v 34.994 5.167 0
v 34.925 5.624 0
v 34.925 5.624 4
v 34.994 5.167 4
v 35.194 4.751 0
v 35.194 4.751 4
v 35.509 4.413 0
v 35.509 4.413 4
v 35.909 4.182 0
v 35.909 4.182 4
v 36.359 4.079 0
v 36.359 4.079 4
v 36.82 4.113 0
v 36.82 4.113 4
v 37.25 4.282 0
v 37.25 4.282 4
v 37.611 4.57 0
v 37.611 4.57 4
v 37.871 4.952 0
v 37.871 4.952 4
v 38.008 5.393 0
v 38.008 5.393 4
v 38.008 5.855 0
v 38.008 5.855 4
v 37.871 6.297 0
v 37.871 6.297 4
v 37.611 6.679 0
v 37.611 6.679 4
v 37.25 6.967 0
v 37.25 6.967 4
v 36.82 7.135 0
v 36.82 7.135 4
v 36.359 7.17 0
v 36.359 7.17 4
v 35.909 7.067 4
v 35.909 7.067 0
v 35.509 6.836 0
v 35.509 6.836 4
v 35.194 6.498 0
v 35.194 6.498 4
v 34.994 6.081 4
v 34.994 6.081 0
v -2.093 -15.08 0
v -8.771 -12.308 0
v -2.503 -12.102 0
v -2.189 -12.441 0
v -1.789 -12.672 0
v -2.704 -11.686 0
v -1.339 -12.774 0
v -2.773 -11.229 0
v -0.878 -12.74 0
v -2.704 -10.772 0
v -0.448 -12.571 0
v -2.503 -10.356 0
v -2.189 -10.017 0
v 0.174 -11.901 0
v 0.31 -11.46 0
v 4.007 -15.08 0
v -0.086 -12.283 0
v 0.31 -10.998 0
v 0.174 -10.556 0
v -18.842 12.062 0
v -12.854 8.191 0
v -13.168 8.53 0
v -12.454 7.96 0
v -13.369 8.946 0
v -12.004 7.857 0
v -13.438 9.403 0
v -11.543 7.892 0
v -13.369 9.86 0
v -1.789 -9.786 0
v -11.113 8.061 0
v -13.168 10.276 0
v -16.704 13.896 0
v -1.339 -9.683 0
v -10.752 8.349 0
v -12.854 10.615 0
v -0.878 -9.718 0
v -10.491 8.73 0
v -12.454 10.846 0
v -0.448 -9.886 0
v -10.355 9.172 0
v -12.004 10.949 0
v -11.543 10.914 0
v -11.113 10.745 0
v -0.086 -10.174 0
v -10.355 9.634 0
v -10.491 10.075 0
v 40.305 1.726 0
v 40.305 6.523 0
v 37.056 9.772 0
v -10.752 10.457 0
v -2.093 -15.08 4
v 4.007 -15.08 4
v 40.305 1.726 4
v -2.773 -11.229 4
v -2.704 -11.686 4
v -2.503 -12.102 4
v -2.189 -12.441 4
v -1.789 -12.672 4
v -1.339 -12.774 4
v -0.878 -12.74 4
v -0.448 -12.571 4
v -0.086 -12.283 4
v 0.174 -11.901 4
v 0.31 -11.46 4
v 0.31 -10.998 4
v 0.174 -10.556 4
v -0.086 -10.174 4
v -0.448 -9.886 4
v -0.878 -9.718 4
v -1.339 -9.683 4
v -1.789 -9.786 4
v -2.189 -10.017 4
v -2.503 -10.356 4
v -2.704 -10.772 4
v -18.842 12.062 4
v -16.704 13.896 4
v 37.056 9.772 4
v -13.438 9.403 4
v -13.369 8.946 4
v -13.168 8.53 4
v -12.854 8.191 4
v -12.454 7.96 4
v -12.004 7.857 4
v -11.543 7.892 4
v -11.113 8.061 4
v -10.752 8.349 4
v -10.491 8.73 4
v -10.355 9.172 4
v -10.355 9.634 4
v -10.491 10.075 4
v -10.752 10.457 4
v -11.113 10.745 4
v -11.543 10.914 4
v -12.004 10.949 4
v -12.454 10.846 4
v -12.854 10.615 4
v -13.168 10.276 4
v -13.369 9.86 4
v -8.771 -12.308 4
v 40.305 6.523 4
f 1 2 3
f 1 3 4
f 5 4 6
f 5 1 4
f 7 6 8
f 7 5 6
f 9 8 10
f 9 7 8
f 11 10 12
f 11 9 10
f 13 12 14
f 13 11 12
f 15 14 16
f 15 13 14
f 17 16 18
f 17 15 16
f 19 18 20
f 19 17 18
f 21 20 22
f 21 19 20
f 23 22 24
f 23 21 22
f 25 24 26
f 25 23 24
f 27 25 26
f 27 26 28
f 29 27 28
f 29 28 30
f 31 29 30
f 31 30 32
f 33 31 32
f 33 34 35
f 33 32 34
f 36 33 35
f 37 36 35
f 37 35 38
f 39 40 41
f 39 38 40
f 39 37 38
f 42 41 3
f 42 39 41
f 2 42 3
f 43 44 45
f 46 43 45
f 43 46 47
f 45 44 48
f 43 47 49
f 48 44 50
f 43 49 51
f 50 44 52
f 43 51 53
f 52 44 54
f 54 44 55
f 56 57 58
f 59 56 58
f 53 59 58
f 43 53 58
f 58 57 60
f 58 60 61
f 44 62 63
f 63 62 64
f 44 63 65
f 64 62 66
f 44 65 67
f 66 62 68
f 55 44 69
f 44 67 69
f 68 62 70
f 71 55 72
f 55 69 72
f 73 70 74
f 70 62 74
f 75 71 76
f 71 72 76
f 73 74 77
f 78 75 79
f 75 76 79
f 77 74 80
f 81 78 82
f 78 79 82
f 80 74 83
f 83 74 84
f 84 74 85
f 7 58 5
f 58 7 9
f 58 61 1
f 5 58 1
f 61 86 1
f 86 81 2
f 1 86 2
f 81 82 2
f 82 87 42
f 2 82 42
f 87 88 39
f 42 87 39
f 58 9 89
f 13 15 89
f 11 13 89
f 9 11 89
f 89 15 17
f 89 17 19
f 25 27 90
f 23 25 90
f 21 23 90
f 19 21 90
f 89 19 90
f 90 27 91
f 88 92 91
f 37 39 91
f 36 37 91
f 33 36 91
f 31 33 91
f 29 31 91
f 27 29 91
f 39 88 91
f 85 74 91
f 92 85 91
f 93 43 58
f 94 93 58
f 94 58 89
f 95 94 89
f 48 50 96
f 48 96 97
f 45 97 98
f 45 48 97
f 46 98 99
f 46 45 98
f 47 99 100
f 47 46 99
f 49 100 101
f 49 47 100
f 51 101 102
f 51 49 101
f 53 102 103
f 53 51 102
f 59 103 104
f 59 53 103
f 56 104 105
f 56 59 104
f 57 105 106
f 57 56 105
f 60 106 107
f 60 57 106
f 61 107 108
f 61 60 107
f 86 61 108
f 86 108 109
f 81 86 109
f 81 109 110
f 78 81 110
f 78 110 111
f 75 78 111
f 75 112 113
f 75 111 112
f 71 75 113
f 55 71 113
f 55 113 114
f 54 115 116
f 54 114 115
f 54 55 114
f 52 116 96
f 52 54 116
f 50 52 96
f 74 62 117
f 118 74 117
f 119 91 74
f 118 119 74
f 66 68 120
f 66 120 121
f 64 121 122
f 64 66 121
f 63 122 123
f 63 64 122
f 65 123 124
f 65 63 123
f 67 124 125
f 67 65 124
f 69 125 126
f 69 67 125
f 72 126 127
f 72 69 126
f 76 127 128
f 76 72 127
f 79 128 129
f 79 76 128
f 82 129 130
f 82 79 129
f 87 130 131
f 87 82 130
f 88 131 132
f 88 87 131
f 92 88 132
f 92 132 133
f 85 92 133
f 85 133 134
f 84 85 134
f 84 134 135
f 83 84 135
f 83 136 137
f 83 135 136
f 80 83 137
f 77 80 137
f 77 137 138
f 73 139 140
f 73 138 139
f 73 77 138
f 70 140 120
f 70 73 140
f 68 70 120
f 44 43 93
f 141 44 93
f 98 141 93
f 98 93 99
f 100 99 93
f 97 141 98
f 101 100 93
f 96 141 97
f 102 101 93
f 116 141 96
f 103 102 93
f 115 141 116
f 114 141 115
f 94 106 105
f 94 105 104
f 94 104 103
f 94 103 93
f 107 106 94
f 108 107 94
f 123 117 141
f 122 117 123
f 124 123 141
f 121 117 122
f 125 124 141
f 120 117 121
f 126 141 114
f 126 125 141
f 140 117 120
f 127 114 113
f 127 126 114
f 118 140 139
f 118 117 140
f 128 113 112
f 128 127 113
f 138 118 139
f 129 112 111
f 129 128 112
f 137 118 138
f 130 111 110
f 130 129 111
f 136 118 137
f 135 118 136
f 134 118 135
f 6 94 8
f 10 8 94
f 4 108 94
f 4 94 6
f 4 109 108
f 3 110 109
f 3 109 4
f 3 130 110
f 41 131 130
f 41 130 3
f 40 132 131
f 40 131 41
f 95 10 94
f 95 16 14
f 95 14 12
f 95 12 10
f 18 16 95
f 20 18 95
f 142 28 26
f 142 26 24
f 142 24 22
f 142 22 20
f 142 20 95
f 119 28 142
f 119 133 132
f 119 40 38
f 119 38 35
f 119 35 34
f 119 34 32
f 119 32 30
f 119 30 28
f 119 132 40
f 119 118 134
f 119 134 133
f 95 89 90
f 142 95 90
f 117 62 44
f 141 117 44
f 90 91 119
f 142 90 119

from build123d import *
from OCP.BRepFilletAPI import BRepFilletAPI_MakeChamfer

# Parameters (mm, degrees)
BOSS_EXTRU_1_DEPTH           = 4
ENL_V_MAT_EXTRU_1_DEPTH      = 4
ENL_V_MAT_EXTRU_1_DEPTH_BACK = 7
ESQUISSE2_R                  = 1.55
CHANFREIN1_SIZE              = 3
CHANFREIN1_SIZE2             = 3.25880074
CHANFREIN1_SIZE2_2           = 5.532342211
CHANFREIN1_SIZE2_3           = 2.232526106


with BuildPart() as part:
    # Esquisse1 → Boss.-Extru.1 (new body)
    with BuildSketch(Plane.XY):
        Polygon((-19.694718841, 14.12522617), (-7.625402576, -15.080300035), (4.007307014, -15.080300035), (40.305281159, 1.726159227), (40.305281159, 9.522549697), align=None)
    extrude(amount=BOSS_EXTRU_1_DEPTH)

    # Esquisse2 → Enlèv. mat.-Extru.1 (cut, two sides: drawn at the far end of the back side and taken through both)
    with BuildSketch(Plane.XY.offset(4).offset(-ENL_V_MAT_EXTRU_1_DEPTH_BACK)):
        with Locations(Location((-11.887750079, 9.402917456, 0), (0, 0, 180))):
            Circle(ESQUISSE2_R)
        with Locations(Location((-1.222675499, -11.228701649, 0), (0, 0, 180))):
            Circle(ESQUISSE2_R)
        with Locations(Location((36.47491806, 5.624354462, 0), (0, 0, 180))):
            Circle(ESQUISSE2_R)
    extrude(amount=ENL_V_MAT_EXTRU_1_DEPTH + ENL_V_MAT_EXTRU_1_DEPTH_BACK, mode=Mode.SUBTRACT)

    # Chanfrein1: one chamfer whose edges measure the first distance from different faces: ONE call of the kernel's chamfer builder (chamfer() names one face for all edges)
    chanfrein1_edges_1 = [part.edges().sort_by_distance(p)[0] for p in [
        (40.305281159, 9.522549697, 2),
    ]]
    chanfrein1_side_1 = [part.faces().sort_by_distance(p)[0] for p in [
        (40.305281159, 5.624354462, 2),
    ]]
    chanfrein1_edges_2 = [part.edges().sort_by_distance(p)[0] for p in [
        (-7.625402576, -15.080300035, 2),
    ]]
    chanfrein1_side_2 = [part.faces().sort_by_distance(p)[0] for p in [
        (-13.660060709, -0.477536933, 2),
    ]]
    chanfrein1_edges_3 = [part.edges().sort_by_distance(p)[0] for p in [
        (-19.694718841, 14.12522617, 2),
    ]]
    chanfrein1_side_3 = [part.faces().sort_by_distance(p)[0] for p in [
        (10.305281159, 11.823887933, 2),
    ]]
    chanfrein1 = BRepFilletAPI_MakeChamfer(part.part.solid().wrapped)
    for e in chanfrein1_edges_1:
        chanfrein1.Add(CHANFREIN1_SIZE, CHANFREIN1_SIZE2, e.wrapped, chanfrein1_side_1[0].wrapped)  # the first distance lies on this face
    for e in chanfrein1_edges_2:
        chanfrein1.Add(CHANFREIN1_SIZE, CHANFREIN1_SIZE2_2, e.wrapped, chanfrein1_side_2[0].wrapped)  # the first distance lies on this face
    for e in chanfrein1_edges_3:
        chanfrein1.Add(CHANFREIN1_SIZE, CHANFREIN1_SIZE2_3, e.wrapped, chanfrein1_side_3[0].wrapped)  # the first distance lies on this face
    add(Compound.cast(chanfrein1.Shape()), mode=Mode.REPLACE)


solid = part.part
